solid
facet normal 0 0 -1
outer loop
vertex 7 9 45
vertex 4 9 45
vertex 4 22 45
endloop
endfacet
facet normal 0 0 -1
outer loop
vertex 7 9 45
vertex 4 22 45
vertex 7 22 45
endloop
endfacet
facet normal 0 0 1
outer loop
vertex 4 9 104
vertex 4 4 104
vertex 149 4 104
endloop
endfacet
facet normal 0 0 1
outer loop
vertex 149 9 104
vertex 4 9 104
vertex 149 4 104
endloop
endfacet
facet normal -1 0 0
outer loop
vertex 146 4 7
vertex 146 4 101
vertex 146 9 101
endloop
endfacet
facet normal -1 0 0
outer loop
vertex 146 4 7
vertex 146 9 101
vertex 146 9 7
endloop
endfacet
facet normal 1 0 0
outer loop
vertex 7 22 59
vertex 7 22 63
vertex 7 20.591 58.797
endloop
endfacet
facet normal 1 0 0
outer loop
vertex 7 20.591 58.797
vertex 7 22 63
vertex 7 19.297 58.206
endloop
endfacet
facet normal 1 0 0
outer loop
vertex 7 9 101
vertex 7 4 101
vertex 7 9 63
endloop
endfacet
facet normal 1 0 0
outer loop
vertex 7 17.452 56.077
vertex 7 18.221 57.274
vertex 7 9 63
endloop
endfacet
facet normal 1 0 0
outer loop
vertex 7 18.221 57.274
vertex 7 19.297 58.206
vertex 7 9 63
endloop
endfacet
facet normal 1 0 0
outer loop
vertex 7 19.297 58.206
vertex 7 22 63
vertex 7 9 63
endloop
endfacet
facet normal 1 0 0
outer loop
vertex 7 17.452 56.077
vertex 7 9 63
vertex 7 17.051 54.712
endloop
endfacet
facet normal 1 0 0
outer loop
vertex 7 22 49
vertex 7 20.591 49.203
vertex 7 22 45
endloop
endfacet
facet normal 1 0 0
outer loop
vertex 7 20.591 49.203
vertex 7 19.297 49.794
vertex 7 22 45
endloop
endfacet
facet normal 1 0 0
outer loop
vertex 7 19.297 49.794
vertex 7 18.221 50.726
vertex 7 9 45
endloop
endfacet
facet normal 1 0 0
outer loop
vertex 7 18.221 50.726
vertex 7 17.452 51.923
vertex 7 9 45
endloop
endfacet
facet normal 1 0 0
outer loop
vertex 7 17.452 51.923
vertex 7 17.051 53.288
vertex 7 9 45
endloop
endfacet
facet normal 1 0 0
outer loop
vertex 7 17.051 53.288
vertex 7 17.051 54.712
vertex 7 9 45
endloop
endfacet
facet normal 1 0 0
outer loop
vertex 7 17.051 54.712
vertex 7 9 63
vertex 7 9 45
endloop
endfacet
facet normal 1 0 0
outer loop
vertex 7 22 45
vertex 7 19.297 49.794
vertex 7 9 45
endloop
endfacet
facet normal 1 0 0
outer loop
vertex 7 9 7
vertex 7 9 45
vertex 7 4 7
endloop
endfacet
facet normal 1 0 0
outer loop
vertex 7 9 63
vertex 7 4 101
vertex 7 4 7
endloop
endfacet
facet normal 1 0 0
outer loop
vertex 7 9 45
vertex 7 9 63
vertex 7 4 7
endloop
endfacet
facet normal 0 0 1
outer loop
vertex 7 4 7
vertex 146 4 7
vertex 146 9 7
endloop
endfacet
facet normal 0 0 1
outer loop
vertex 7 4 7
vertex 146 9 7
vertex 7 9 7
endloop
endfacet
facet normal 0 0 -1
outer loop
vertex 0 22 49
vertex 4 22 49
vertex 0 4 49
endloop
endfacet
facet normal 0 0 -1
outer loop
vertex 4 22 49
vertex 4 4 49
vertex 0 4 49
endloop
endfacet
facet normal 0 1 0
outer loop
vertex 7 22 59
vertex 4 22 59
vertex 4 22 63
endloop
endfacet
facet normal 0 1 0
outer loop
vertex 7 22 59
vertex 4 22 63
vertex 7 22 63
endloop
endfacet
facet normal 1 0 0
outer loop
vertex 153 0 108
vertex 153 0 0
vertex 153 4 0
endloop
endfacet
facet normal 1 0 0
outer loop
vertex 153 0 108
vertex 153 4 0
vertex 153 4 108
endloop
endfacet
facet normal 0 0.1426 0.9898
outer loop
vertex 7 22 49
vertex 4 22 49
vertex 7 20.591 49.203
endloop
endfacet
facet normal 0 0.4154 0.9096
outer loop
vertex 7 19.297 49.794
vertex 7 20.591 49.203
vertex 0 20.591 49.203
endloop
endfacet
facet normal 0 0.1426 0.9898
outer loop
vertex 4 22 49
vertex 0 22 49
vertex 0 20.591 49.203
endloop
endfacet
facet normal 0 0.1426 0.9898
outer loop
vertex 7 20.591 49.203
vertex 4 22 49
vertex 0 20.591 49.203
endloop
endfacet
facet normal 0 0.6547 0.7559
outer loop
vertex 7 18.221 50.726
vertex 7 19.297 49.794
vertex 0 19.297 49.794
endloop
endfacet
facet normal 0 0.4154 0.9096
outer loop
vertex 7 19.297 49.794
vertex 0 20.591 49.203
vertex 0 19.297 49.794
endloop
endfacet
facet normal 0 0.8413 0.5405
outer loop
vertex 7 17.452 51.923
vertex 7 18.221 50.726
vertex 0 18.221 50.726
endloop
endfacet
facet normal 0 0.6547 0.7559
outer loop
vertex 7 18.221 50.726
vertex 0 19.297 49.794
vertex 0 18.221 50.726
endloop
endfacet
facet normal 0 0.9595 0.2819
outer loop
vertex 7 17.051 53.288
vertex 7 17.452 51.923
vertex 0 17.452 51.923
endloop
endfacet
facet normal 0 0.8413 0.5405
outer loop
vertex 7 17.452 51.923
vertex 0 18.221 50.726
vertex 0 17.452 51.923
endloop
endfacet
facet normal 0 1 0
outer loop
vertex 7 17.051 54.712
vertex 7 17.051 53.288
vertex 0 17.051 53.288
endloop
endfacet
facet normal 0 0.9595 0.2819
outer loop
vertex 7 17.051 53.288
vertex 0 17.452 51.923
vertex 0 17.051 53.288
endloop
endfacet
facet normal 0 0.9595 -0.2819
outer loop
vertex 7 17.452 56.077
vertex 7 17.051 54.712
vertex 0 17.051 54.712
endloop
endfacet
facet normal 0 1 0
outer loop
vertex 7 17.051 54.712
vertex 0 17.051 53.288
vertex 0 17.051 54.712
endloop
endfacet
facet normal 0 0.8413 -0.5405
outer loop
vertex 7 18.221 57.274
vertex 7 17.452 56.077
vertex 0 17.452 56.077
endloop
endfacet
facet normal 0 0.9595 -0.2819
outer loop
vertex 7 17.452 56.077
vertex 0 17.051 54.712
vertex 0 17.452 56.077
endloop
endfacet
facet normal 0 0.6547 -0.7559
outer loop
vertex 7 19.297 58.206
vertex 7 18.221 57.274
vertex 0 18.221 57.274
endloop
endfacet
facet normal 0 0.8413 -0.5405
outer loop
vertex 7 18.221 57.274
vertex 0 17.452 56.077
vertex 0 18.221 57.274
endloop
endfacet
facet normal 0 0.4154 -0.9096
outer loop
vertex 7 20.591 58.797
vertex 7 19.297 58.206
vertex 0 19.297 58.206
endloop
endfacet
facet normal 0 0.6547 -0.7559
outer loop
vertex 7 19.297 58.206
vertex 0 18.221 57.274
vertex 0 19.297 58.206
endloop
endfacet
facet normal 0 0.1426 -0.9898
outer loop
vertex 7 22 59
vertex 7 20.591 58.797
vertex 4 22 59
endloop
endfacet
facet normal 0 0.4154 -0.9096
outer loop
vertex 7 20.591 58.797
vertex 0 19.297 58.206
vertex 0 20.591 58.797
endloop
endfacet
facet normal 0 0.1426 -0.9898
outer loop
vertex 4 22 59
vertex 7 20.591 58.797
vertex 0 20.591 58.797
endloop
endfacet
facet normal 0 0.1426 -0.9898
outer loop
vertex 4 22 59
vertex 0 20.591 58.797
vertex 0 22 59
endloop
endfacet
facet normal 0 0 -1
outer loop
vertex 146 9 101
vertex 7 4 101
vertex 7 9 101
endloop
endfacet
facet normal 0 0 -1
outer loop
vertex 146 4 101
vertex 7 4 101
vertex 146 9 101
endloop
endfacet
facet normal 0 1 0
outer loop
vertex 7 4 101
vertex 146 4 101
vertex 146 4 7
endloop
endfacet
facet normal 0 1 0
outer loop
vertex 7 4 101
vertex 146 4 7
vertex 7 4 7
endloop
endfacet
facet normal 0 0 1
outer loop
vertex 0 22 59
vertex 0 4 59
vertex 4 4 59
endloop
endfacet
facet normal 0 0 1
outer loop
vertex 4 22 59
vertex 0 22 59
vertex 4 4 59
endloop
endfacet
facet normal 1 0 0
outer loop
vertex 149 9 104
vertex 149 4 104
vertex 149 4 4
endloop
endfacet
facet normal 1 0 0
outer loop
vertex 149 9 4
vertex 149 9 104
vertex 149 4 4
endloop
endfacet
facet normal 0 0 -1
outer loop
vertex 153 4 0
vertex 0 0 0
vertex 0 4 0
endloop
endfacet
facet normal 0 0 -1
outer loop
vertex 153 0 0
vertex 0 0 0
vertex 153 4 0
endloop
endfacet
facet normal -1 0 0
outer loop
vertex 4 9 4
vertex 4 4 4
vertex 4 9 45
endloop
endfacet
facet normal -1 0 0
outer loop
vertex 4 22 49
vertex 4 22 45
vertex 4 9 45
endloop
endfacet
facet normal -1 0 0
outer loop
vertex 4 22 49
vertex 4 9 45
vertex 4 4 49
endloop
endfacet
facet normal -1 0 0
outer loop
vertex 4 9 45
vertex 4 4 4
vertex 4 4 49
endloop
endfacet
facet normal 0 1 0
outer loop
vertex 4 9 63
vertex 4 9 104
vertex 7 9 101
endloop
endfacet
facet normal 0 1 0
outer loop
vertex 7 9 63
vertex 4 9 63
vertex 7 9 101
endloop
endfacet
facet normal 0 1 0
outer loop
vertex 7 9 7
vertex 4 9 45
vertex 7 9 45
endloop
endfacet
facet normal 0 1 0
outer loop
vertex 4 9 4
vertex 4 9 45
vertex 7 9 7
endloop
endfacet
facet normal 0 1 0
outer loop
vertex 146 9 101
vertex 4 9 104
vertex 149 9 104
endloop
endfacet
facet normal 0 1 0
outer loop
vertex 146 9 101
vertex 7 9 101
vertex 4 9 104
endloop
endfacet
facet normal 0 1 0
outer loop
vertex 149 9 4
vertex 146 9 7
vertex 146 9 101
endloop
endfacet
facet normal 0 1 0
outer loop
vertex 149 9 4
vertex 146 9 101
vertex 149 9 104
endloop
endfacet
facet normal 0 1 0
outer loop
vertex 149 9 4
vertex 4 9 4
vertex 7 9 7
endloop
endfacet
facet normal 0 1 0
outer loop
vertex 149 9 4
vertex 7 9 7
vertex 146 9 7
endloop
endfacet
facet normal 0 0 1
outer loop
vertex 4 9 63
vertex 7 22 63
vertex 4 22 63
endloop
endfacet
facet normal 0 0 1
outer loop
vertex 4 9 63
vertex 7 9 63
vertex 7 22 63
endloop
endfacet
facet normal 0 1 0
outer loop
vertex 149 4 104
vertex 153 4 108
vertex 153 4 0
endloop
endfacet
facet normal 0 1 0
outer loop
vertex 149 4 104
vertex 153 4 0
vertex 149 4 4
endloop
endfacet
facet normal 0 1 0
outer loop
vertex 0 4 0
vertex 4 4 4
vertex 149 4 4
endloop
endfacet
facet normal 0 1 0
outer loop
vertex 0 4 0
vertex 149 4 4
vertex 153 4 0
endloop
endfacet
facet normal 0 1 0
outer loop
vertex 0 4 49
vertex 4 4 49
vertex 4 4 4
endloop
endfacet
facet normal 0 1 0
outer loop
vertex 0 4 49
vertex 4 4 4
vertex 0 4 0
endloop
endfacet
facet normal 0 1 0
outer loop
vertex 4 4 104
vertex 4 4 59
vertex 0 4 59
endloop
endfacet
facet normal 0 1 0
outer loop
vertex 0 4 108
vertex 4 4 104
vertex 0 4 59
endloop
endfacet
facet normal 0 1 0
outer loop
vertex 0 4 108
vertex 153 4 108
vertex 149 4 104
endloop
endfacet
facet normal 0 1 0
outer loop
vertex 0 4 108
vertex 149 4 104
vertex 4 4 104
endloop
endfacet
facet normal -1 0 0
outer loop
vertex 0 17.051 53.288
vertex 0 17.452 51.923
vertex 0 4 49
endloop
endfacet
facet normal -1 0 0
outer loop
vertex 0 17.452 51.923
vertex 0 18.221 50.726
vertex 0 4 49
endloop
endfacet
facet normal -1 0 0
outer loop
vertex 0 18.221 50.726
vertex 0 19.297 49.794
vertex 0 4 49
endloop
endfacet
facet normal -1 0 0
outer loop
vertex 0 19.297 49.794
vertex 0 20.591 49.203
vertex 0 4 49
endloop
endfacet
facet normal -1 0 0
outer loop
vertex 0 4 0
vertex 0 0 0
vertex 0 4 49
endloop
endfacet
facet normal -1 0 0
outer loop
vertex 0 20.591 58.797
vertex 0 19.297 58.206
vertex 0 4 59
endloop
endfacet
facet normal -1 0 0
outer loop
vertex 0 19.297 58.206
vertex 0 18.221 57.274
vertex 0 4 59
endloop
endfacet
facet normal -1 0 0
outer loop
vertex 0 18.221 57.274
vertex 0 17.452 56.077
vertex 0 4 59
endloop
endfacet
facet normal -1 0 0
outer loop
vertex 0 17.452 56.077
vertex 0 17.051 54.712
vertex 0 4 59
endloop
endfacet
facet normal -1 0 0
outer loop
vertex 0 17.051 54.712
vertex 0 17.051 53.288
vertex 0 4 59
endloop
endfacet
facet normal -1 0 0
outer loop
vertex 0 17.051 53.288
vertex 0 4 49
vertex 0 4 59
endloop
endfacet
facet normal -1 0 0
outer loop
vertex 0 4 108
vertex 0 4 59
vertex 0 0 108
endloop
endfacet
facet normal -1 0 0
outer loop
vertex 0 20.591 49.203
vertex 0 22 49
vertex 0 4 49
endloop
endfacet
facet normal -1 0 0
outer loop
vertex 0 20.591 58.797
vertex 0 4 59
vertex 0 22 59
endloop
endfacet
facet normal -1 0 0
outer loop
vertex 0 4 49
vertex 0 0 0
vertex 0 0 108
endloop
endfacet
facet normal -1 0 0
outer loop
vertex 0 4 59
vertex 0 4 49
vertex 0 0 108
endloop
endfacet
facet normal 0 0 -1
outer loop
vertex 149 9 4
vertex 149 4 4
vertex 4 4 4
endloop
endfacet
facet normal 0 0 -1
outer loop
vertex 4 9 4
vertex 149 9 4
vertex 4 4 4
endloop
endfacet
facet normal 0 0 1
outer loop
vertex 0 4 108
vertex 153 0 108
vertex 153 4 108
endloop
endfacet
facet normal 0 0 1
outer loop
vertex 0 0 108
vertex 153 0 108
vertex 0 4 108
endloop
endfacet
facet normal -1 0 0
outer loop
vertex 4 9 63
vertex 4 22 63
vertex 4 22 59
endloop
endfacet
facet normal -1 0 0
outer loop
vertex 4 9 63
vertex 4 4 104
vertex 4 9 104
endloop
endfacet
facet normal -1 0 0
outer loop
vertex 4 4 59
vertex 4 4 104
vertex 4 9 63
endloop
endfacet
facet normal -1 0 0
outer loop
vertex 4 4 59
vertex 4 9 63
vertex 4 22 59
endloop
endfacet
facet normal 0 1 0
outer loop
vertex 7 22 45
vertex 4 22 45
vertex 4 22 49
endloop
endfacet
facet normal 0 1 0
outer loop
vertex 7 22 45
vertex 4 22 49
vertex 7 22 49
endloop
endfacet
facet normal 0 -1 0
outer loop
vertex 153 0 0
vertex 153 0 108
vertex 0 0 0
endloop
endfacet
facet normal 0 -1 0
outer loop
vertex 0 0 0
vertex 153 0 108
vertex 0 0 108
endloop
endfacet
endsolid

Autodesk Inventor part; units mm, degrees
ref_plane "YZ Plane" through (0, 0, 0) normal (1, 0, 0) x (0, 1, 0)
ref_plane "XZ Plane" through (0, 0, 0) normal (0, 1, 0) x (-1, 0, 0)
ref_plane "XY Plane" through (0, 0, 0) normal (0, 0, 1) x (1, 0, 0)
sketch "Sketch1" plane through (0, 0, 0) normal (0, 1, 0) x (-1, 0, 0)
  line L0 (0, 0) -> (-153, 0)
  line L1 (-153, 0) -> (-153, 108)
  line L2 (-153, 108) -> (0, 108)
  line L3 (0, 108) -> (0, 0)
  dimension "d0" = 153
  dimension "d1" = 108
extrude "Extrusion1" add sketch "Sketch1" along normal blind 4
sketch "Sketch2" plane through (0, 4, 0) normal (0, 1, 0) x (1, 0, 0)
  line L0 (0, -108) -> (153, -108) projected
  line L1 (0, -108) -> (4, -108)
  line L2 (4, -108) -> (4, -104)
  line L3 (4, -104) -> (0, -104)
  line L4 (0, -104) -> (0, -108)
  line L5 (4, -104) -> (149, -104)
  line L6 (149, -104) -> (149, -4)
  line L7 (149, -4) -> (4, -4)
  line L8 (4, -4) -> (4, -104)
  line L9 (153, -108) -> (153, 0) projected
  line L10 (0, -108) -> (153, -108)
  line L11 (153, -108) -> (153, 0)
  line L12 (153, 0) -> (0, 0)
  line L13 (0, 0) -> (0, -108)
  line L14 (4, -104) -> (7, -104)
  line L15 (7, -104) -> (7, -101)
  line L16 (7, -101) -> (4, -101)
  line L17 (4, -101) -> (4, -104)
  line L18 (7, -101) -> (146, -101)
  line L19 (146, -101) -> (146, -7)
  line L20 (146, -7) -> (7, -7)
  line L21 (7, -7) -> (7, -101)
  dimension "d4" = 4
  dimension "d5" = 4
  dimension "d6" = 145
  dimension "d7" = 100
  dimension "d8" = 3
  dimension "d9" = 3
  dimension "d10" = 139
  dimension "d11" = 94
extrude "Extrusion2" add sketch "Sketch2" along normal blind 5 contours L8 L16 L15 L5 | L15 L16 L8 L7 L6 L5
sketch "Sketch3" plane through (0, 4, 0) normal (0, 1, 0) x (1, 0, 0)
  line L0 (0, 0) -> (0, -108) projected
  line L1 (0, -59) -> (4, -59)
  line L2 (4, -59) -> (4, -49)
  line L3 (4, -49) -> (0, -49)
  line L4 (0, -49) -> (0, -59)
  dimension "d14" = 4
  dimension "d15" = 10
extrude "Extrusion3" add sketch "Sketch3" along normal blind 18
sketch "Sketch4" plane through (4, 9, 49) normal (1, 0, 0) x (0, 0, -1)
  line L0 (0, 13) -> (-10, 13) projected
  circle A0 centre (-5, 13) radius 5
  point P0 (49, -9)
extrude "Extrusion4" cut sketch "Sketch4" against normal blind 18 contours A0 L0 picked at (-6.2475, 11.0971)
sketch "Sketch5" plane through (0, 9, 0) normal (0, 1, 0) x (1, 0, 0)
  line L0 (7, -101) -> (7, -7) projected
  line L1 (4, -45) -> (7, -45)
  line L2 (7, -45) -> (7, -63)
  line L3 (7, -63) -> (4, -63)
  line L4 (4, -63) -> (4, -45)
  point P0 (0, 0)
  dimension "d20" = 18
extrude "Extrusion5" add sketch "Sketch5" along normal blind 13
sketch "Sketch6" plane through (4, 22, 54) normal (-1, 0, 0) x (0, 0, 1)
  line L0 (-5, 0) -> (5, 0) projected
  circle A0 centre (0, 0) radius 5
  point P0 (-54, -22)
extrude "Extrusion6" cut sketch "Sketch6" against normal blind 13 contours L0 A0 picked at (0.9468, -1.3716)
properties part number "Golf Cart Mainboard Lid_3DPrint"
